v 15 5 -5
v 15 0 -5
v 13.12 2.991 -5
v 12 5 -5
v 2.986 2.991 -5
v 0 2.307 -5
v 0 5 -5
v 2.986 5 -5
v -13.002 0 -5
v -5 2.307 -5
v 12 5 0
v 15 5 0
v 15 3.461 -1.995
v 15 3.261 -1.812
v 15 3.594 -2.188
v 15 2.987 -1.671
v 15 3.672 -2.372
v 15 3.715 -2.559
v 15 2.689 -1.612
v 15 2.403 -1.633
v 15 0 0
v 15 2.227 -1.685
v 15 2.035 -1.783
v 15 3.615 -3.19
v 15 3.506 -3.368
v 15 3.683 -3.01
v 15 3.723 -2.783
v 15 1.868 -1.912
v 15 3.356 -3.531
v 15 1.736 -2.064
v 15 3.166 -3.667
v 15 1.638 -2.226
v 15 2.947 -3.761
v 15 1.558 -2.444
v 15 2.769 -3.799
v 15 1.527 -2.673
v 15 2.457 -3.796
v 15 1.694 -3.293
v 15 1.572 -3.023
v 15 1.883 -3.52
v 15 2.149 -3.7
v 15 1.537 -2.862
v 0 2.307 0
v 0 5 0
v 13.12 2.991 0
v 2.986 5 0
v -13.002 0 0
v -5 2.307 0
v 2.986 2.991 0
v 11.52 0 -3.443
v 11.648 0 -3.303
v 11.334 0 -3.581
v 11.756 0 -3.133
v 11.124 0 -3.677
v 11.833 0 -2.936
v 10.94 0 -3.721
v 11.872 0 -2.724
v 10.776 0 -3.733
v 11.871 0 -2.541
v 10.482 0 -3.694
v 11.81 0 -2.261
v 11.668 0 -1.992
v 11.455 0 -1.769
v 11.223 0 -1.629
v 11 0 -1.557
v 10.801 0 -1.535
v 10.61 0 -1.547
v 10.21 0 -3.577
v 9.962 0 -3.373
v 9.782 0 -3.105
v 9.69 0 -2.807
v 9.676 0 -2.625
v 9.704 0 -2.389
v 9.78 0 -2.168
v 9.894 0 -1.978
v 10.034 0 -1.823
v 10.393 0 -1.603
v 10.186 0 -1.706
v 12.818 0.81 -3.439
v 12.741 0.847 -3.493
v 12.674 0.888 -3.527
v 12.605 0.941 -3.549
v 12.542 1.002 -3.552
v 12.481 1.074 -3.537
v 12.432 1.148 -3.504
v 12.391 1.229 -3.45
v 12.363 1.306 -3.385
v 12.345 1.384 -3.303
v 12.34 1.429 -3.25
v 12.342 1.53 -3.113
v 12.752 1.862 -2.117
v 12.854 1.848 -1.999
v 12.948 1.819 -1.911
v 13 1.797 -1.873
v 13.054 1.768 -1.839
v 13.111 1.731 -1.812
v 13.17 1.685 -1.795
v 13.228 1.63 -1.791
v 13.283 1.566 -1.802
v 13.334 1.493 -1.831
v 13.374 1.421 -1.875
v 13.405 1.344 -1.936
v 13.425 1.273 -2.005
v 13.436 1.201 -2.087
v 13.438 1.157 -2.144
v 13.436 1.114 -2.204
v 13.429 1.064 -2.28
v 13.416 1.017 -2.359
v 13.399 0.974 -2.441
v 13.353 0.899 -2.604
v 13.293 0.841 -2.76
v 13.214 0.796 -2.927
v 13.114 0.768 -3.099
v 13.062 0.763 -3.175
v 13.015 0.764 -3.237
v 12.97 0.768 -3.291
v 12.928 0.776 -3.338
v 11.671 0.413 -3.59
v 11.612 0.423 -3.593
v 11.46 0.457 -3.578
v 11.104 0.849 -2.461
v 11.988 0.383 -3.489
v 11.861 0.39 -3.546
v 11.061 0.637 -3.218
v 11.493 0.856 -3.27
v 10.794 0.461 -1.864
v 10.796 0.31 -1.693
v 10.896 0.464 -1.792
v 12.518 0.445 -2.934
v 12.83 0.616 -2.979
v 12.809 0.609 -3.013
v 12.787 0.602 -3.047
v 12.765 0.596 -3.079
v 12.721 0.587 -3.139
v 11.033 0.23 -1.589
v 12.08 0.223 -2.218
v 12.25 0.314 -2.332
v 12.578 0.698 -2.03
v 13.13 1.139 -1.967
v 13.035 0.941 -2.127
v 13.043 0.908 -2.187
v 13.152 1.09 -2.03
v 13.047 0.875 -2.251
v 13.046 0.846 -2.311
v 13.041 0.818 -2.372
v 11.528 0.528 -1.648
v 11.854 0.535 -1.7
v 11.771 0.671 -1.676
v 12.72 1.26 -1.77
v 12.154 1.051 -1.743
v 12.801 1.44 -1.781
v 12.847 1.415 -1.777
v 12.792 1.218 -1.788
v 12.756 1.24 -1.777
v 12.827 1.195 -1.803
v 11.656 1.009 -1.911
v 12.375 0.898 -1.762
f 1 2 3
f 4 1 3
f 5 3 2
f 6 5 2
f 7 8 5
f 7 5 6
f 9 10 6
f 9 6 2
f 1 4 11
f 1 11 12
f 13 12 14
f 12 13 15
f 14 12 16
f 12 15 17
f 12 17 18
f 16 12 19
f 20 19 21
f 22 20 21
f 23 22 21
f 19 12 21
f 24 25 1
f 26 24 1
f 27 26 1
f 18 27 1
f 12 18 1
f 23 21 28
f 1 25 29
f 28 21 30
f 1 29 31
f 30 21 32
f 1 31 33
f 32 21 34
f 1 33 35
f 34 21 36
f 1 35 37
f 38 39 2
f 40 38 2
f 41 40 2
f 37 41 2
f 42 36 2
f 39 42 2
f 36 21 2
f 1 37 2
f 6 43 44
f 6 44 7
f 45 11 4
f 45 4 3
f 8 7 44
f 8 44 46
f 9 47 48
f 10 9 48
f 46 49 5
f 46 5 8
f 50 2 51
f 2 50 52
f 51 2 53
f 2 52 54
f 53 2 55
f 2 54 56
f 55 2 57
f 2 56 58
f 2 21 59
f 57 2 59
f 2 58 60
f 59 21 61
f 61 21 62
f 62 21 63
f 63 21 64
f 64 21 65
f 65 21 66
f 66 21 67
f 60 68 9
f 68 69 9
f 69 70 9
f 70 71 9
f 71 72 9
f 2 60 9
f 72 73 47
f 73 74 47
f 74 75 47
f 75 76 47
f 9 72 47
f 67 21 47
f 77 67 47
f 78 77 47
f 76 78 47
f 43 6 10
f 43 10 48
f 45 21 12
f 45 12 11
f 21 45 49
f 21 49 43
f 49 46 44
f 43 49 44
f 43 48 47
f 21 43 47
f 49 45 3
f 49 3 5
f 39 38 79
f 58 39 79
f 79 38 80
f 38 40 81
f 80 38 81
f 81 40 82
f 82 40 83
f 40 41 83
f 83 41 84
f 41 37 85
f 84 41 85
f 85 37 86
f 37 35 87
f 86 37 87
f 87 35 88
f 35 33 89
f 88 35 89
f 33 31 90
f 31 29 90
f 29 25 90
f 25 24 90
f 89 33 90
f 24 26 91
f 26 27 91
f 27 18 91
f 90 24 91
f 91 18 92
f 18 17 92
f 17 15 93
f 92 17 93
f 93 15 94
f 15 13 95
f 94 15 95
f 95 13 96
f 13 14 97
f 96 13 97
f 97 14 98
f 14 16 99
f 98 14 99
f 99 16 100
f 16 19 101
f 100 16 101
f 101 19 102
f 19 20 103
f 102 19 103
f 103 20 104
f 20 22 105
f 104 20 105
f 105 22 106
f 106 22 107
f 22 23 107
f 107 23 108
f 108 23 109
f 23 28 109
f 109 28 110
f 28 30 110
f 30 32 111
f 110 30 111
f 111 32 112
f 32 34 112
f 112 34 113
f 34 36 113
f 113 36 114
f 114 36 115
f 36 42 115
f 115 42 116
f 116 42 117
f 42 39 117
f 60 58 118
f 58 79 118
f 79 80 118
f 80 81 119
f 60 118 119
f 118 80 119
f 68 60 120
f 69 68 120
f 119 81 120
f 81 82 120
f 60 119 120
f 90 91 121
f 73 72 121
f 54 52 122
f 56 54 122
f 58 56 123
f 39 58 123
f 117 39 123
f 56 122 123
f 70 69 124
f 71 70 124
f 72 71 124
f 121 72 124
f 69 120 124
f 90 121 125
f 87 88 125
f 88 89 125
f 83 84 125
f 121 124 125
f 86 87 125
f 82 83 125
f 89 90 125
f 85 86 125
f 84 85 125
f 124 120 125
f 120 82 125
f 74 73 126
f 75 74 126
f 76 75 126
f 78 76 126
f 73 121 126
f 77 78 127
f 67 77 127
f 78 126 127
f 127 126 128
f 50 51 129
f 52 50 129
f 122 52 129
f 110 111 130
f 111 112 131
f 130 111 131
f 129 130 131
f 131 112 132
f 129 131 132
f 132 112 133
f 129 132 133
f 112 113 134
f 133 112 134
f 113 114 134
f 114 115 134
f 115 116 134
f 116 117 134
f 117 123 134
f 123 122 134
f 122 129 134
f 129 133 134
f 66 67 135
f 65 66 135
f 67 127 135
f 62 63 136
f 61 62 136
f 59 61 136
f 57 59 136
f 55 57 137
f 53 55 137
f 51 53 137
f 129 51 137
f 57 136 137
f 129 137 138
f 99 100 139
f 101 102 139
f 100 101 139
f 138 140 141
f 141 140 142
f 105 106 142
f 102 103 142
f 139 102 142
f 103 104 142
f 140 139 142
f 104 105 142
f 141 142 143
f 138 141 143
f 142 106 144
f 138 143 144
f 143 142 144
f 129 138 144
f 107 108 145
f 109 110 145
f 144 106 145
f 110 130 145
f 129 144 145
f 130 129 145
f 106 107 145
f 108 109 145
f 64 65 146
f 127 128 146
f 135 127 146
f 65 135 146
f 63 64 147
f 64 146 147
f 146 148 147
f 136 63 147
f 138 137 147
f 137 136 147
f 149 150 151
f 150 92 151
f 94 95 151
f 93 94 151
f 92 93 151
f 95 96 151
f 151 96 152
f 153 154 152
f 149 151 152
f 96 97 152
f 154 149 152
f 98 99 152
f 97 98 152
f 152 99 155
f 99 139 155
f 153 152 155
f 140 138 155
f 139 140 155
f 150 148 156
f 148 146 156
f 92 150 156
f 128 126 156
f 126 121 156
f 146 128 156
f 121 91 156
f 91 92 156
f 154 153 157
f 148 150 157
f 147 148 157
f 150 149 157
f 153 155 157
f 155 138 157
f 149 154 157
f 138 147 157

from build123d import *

# Parameters (mm, degrees)
SKETCH1_W           = 15
SKETCH1_H           = 5
BOSS_EXTRUDE1_DEPTH = 5
CUT_EXTRUDE1_DEPTH  = 5
SKETCH3_W           = 5
SKETCH3_H           = 2.306580292
BOSS_EXTRUDE2_DEPTH = 5
BOSS_EXTRUDE3_DEPTH = 5


with BuildPart() as part:
    # Sketch1 → Boss-Extrude1 (new body)
    with BuildSketch(Plane(origin=(0, 0, 0), x_dir=(1, 0, 0), z_dir=(0, 1, 0))):
        with Locations((7.5, 2.5)):
            Rectangle(SKETCH1_W, SKETCH1_H)
    extrude(amount=BOSS_EXTRUDE1_DEPTH)

    # Sketch2 → Cut-Extrude1 (cut)
    with BuildSketch(Plane.XY):
        Polygon((3, 5), (12, 5), (13.120394862, 2.991339911), (2.986234937, 2.991339911), (2.986234937, 5), align=None)
    extrude(amount=-CUT_EXTRUDE1_DEPTH, mode=Mode.SUBTRACT)

    # Sketch3 → Boss-Extrude2 (add)
    with BuildSketch(Plane.ZY):
        with Locations((-2.5, 1.153290146)):
            Rectangle(SKETCH3_W, SKETCH3_H)
    extrude(amount=BOSS_EXTRUDE2_DEPTH)

    # Sketch7 → Boss-Extrude3 (add)
    with BuildSketch(Plane.XY):
        Polygon((-5, 0), (-13.001867805, 0), (-5, 2.306580292), align=None)
    extrude(amount=-BOSS_EXTRUDE3_DEPTH)

    # Cut-Loft1: read off the stored shape, not the designer's step
    # Cut-Loft1: loft between two sections, ruled curve by curve
    cut_loft1_from = [
        Edge.make_bspline([(10.775857545, 0, -3.733497041), (10.684223664, 0, -3.733497041), (10.580567417, 0, -3.722354361), (10.355367989, 0, -3.656671194), (10.233384966, 0, -3.601544251), (9.998802229, 0, -3.425607198), (9.886786943, 0, -3.303547063), (9.724445949, 0, -2.999157699), (9.676250966, 0, -2.817158224), (9.676250966, 0, -2.450622698), (9.724445949, 0, -2.268623224), (9.886786943, 0, -1.964233859), (9.998802229, 0, -1.842173724), (10.233384966, 0, -1.666236672), (10.355367989, 0, -1.611109728), (10.580567417, 0, -1.545426562), (10.684223664, 0, -1.534283882), (10.867491427, 0, -1.534283882), (10.971147674, 0, -1.545426562), (11.196347101, 0, -1.611109728), (11.318330124, 0, -1.666236672), (11.552912861, 0, -1.842173724), (11.664928148, 0, -1.964233859), (11.827269142, 0, -2.268623224), (11.875464125, 0, -2.450622698), (11.875464125, 0, -2.817158224), (11.827269142, 0, -2.999157699), (11.664928148, 0, -3.303547063), (11.552912861, 0, -3.425607198), (11.318330124, 0, -3.601544251), (11.196347101, 0, -3.656671194), (10.971147674, 0, -3.722354361), (10.867491427, 0, -3.733497041), (10.775857545, 0, -3.733497041)], [0, 0, 0, 0, 0.0625, 0.0625, 0.125, 0.125, 0.1875, 0.1875, 0.25, 0.25, 0.3125, 0.3125, 0.375, 0.375, 0.4375, 0.4375, 0.5, 0.5, 0.5625, 0.5625, 0.625, 0.625, 0.6875, 0.6875, 0.75, 0.75, 0.8125, 0.8125, 0.875, 0.875, 0.9375, 0.9375, 1, 1, 1, 1], 3),
    ]
    cut_loft1_to = [
        Edge.make_bspline([(15, 1.571629768, -3.022785324), (15, 1.59774719, -3.110618396), (15, 1.637971718, -3.206799289), (15, 1.765116639, -3.403936879), (15, 1.852724527, -3.505148024), (15, 2.088224624, -3.67985524), (15, 2.237148437, -3.752434842), (15, 2.575182586, -3.821285391), (15, 2.763369546, -3.815607976), (15, 3.114701834, -3.71113829), (15, 3.275415798, -3.613068993), (15, 3.520909325, -3.370704781), (15, 3.60598011, -3.228546199), (15, 3.70775901, -2.953548085), (15, 3.725831875, -2.820912459), (15, 3.724604446, -2.586332933), (15, 3.705740921, -2.483800283), (15, 3.653506078, -2.308134139), (15, 3.61328155, -2.211953246), (15, 3.486136629, -2.014815656), (15, 3.398528741, -1.913604511), (15, 3.163028644, -1.738897295), (15, 3.014104831, -1.666317693), (15, 2.676070682, -1.597467144), (15, 2.487883722, -1.603144559), (15, 2.136551433, -1.707614245), (15, 1.97583747, -1.805683542), (15, 1.730343943, -2.048047754), (15, 1.645273158, -2.190206336), (15, 1.543494258, -2.46520445), (15, 1.525421393, -2.597840076), (15, 1.526648822, -2.832419602), (15, 1.545512347, -2.934952252), (15, 1.571629768, -3.022785324)], [0, 0, 0, 0, 0.0625, 0.0625, 0.125, 0.125, 0.1875, 0.1875, 0.25, 0.25, 0.3125, 0.3125, 0.375, 0.375, 0.4375, 0.4375, 0.5, 0.5, 0.5625, 0.5625, 0.625, 0.625, 0.6875, 0.6875, 0.75, 0.75, 0.8125, 0.8125, 0.875, 0.875, 0.9375, 0.9375, 1, 1, 1, 1], 3),
    ]
    cut_loft1 = Solid(Shell([*[Face.make_surface_from_curves(cut_loft1_from[k], cut_loft1_to[k]) for k in range(1)], Face(Wire(cut_loft1_from)), Face(Wire(cut_loft1_to))]))
    add(cut_loft1, mode=Mode.SUBTRACT)


solid = part.part
